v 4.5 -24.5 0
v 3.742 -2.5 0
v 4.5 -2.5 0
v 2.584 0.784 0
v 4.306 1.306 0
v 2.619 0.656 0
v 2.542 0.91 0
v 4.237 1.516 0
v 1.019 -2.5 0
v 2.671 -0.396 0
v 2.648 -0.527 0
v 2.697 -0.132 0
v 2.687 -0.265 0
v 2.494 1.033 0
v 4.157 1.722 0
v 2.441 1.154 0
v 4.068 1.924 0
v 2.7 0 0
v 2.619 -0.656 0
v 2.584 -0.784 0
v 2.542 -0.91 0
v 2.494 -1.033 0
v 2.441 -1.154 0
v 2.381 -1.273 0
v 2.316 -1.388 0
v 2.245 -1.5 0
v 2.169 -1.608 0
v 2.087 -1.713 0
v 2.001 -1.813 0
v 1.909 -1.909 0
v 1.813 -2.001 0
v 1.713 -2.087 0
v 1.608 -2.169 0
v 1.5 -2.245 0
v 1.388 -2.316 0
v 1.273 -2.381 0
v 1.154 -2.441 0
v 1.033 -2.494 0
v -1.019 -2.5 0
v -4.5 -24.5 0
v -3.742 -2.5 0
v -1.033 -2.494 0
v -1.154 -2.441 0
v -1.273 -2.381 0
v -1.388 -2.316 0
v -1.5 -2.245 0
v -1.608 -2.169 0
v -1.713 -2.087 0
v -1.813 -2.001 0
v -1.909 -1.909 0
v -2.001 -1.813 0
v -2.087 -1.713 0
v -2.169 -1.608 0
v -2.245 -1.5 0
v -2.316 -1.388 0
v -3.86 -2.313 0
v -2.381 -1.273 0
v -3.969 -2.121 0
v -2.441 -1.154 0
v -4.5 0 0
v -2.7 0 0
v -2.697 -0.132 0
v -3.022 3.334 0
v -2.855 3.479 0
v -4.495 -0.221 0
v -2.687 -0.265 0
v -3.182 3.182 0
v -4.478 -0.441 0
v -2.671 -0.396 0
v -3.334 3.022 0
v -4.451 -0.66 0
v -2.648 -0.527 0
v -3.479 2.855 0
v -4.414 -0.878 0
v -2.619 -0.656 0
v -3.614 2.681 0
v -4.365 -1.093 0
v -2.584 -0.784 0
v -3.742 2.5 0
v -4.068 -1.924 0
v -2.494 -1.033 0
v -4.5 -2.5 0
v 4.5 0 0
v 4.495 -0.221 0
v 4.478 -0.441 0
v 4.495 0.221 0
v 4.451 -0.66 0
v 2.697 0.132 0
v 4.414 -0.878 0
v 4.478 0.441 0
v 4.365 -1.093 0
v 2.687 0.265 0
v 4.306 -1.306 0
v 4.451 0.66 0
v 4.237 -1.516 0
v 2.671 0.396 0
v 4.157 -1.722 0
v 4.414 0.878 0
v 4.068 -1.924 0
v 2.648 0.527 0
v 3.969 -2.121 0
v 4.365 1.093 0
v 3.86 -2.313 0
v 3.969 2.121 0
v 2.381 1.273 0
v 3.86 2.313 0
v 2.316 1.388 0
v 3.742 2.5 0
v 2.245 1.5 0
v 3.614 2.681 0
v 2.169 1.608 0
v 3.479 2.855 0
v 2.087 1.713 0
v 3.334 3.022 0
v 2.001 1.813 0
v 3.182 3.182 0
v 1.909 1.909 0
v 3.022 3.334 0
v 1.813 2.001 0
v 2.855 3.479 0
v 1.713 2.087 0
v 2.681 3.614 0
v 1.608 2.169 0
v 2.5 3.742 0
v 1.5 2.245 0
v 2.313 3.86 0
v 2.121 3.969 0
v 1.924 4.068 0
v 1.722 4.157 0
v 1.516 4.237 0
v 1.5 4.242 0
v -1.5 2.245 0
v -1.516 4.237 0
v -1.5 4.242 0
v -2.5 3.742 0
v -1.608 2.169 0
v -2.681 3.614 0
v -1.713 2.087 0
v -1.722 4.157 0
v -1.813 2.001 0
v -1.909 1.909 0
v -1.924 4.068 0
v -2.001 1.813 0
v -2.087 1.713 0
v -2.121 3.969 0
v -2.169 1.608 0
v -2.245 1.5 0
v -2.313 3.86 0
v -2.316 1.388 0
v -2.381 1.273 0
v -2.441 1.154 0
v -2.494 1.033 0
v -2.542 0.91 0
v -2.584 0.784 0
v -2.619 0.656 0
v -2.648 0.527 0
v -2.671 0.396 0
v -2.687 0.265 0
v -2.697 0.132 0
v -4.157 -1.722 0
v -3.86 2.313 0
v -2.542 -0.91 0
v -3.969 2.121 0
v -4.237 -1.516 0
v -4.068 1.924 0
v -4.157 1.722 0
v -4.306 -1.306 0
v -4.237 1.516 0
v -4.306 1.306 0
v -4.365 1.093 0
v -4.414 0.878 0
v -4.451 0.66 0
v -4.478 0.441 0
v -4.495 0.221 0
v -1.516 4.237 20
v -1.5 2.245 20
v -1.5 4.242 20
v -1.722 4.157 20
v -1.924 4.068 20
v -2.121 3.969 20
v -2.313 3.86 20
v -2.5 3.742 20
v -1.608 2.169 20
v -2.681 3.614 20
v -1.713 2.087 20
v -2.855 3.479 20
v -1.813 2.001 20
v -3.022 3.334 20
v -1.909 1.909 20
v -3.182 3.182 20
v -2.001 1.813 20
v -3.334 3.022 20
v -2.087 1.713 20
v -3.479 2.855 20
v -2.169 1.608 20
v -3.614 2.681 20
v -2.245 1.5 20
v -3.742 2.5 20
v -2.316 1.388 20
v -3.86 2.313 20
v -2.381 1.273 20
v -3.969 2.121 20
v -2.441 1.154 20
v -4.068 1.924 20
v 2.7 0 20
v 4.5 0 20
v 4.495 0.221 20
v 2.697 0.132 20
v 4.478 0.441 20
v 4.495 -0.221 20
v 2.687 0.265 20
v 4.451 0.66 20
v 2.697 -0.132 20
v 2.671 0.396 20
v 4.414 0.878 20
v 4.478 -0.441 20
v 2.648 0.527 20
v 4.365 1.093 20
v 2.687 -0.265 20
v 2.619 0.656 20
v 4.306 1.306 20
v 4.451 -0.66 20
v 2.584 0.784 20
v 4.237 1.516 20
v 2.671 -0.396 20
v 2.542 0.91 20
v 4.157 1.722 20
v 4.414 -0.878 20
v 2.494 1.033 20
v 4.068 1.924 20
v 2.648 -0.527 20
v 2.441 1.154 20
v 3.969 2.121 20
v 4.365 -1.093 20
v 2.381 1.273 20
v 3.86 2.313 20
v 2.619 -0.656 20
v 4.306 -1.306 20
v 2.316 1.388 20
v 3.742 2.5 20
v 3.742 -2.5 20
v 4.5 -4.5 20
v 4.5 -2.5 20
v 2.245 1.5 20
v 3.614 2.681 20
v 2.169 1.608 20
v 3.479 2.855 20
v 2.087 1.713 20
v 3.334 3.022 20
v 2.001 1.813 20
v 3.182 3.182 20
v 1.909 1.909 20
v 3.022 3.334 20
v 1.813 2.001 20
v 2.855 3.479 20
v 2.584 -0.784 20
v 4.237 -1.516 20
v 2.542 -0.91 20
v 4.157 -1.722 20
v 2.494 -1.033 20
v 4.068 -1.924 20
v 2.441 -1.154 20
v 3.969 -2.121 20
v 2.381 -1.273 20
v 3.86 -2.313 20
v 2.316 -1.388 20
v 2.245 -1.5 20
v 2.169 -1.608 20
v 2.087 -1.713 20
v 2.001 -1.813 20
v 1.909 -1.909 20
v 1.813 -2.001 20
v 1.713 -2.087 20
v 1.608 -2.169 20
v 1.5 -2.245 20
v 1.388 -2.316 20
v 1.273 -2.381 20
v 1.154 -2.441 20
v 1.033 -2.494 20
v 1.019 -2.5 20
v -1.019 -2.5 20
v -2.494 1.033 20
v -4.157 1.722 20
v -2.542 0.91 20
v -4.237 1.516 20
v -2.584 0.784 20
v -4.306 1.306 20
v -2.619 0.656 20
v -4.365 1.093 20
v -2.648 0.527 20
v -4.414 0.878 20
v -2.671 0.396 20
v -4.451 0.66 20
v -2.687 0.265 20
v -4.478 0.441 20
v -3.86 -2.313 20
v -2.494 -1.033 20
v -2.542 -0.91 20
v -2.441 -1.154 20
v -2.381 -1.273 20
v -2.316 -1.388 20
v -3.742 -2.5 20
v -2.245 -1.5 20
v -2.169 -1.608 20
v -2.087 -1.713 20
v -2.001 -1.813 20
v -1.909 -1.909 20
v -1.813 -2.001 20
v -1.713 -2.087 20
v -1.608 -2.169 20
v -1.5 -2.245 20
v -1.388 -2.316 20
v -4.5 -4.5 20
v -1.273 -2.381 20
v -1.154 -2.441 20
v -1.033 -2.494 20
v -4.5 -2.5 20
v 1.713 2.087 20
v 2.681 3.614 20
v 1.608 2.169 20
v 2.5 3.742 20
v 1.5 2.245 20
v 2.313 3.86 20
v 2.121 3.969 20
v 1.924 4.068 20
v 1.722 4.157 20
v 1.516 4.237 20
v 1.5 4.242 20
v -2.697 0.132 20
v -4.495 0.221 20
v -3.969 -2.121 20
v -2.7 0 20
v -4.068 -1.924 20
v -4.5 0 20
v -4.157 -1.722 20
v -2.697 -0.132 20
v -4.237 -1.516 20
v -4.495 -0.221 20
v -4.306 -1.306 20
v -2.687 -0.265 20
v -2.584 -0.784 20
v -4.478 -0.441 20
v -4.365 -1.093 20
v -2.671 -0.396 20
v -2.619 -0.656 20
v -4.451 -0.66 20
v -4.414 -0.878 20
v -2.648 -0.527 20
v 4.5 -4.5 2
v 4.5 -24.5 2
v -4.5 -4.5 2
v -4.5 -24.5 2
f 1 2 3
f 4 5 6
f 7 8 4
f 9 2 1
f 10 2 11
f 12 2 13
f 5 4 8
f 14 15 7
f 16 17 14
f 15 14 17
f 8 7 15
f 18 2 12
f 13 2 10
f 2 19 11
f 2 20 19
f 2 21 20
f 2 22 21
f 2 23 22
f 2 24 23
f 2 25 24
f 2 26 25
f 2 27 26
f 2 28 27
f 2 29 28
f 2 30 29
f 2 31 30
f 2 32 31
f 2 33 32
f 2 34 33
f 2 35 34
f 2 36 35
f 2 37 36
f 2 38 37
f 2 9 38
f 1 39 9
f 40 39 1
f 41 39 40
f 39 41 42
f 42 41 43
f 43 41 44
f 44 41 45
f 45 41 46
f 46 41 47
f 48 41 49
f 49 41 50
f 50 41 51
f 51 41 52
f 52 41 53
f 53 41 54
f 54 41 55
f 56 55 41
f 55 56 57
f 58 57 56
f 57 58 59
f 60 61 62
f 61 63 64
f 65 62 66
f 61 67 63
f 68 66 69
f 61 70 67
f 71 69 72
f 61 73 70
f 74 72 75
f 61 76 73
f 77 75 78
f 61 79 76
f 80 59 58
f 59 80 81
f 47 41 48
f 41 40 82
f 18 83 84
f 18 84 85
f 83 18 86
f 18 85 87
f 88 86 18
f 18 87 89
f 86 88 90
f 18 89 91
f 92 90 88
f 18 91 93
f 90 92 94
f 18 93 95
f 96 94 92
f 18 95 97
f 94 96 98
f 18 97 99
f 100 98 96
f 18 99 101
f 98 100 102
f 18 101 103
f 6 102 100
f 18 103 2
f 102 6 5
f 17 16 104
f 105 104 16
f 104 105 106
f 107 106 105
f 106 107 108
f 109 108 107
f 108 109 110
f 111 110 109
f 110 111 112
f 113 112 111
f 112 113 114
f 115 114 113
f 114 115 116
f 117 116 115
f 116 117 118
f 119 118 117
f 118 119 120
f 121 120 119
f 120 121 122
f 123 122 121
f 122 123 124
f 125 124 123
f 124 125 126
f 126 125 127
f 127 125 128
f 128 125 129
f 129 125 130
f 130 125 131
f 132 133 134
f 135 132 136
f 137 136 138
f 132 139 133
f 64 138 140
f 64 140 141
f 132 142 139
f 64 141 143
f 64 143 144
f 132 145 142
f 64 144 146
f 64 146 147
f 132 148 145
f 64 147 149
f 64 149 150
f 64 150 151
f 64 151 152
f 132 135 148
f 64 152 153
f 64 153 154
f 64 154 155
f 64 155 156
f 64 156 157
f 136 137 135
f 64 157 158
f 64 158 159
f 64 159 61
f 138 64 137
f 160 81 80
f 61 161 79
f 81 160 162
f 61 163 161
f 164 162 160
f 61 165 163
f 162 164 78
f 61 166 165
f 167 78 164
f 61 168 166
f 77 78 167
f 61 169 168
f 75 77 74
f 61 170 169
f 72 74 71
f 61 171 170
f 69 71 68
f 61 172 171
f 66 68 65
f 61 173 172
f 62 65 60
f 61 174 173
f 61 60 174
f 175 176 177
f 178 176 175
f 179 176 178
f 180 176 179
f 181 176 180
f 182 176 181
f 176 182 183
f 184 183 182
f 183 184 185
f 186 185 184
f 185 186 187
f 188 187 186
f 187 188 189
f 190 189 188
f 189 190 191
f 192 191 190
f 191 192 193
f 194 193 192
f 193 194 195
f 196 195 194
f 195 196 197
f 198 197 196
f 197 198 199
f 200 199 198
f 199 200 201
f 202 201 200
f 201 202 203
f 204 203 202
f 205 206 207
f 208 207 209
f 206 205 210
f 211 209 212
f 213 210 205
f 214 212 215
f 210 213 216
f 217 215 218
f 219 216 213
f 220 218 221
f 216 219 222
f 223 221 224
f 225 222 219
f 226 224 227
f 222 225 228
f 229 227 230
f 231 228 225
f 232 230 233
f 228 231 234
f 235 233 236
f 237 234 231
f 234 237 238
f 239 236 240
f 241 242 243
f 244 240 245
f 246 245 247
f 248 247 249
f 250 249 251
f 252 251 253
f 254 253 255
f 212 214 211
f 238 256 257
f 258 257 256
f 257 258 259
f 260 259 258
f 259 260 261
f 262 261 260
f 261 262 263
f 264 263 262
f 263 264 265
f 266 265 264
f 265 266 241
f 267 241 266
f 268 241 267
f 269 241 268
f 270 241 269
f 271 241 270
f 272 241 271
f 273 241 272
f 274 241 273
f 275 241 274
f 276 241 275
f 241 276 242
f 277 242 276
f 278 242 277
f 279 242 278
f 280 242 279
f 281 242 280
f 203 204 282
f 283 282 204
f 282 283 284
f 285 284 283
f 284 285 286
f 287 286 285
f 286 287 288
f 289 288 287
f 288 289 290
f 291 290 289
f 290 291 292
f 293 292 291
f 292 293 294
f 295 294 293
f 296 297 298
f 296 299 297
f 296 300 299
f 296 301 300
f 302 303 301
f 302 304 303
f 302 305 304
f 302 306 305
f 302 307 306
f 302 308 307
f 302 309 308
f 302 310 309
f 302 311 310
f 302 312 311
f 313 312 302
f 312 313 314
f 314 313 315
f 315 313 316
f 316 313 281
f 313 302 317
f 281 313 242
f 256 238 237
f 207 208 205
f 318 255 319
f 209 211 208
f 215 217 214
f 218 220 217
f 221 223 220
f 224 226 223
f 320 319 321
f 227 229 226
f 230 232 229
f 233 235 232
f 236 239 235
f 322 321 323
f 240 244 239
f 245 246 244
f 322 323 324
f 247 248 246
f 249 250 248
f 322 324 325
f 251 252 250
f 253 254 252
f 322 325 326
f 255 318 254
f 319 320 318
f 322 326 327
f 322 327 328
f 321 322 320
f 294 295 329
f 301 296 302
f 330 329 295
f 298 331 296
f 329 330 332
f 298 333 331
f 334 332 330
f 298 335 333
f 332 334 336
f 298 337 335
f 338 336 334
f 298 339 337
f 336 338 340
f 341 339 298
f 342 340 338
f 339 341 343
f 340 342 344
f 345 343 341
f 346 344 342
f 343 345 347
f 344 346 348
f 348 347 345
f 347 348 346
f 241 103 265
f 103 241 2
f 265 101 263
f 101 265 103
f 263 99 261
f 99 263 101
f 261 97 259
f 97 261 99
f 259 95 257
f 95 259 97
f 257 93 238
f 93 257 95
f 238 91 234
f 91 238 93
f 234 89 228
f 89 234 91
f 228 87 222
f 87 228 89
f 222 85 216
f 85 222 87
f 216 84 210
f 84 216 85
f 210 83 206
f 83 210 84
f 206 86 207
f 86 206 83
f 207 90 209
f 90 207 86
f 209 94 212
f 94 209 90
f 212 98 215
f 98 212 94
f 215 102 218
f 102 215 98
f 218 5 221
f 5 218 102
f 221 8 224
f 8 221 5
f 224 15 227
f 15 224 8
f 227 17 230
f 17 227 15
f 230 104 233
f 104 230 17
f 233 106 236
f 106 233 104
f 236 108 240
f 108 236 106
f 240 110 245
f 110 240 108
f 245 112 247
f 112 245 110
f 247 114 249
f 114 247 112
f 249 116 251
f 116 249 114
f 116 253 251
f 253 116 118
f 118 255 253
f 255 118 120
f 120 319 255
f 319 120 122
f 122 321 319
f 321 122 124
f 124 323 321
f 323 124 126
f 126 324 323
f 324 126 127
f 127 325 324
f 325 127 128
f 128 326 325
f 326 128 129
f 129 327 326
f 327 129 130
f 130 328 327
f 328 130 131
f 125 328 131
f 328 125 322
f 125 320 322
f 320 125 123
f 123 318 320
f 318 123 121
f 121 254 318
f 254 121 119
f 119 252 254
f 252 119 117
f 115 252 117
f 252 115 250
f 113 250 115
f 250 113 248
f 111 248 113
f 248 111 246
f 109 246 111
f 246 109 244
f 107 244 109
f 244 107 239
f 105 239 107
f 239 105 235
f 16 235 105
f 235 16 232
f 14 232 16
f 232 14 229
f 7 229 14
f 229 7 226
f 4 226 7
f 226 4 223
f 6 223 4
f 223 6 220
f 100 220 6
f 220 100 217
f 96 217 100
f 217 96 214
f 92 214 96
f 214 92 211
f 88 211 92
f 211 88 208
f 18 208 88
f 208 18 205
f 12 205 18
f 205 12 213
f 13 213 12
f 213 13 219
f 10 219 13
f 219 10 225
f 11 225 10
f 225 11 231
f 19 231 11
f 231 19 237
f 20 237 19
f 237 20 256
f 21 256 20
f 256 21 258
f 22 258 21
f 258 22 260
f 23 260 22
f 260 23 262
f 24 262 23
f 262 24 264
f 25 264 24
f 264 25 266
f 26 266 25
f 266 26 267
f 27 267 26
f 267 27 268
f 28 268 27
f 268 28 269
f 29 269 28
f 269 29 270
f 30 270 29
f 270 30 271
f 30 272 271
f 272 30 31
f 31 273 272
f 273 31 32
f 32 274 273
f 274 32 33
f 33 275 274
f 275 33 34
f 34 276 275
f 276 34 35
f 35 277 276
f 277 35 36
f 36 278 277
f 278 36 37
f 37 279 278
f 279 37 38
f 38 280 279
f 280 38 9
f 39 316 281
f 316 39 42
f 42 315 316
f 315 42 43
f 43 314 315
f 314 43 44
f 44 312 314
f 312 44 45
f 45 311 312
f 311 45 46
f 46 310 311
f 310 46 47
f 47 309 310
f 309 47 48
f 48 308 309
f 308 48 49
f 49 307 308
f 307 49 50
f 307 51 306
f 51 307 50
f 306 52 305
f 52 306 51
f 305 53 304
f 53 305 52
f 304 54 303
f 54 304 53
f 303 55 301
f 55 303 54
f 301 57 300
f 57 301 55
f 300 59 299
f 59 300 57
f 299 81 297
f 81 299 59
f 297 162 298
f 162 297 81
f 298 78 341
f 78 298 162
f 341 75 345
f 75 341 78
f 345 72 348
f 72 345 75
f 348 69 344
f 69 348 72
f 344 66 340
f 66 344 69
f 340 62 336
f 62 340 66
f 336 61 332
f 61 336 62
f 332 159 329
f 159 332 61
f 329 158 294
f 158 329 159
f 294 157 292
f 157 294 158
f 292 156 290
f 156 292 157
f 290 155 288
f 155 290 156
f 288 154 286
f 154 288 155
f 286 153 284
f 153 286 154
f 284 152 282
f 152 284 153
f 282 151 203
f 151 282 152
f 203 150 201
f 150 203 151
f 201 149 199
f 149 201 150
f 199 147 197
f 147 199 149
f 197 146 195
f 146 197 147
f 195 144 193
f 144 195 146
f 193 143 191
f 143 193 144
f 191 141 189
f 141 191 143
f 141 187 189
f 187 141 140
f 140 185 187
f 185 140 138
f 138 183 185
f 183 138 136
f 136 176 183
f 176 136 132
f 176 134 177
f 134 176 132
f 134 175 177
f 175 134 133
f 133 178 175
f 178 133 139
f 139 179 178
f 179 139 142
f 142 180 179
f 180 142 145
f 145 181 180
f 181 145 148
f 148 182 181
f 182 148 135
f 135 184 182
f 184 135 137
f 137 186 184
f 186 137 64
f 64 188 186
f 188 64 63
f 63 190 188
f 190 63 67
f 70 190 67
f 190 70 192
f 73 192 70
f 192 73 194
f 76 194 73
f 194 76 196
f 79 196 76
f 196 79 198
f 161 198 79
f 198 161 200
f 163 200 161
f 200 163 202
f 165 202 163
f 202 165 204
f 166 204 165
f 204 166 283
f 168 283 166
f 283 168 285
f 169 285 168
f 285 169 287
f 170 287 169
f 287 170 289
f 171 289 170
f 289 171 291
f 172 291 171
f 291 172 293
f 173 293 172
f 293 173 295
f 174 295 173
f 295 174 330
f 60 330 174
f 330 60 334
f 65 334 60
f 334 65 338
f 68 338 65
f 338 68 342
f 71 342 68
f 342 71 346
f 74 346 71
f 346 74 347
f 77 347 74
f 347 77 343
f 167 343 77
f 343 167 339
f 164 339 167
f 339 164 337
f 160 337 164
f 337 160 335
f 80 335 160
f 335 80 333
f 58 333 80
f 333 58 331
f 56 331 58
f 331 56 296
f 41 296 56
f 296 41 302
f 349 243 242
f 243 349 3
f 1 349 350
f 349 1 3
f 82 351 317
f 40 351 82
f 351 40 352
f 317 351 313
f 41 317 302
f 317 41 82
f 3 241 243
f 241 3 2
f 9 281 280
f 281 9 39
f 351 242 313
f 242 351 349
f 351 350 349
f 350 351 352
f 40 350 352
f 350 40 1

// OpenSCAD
// file: ../../common/utils.scad
// Common utilities and shared variables
// Include this file at the top of your models:
//   include <../../common/utils.scad>

// ── Units ────────────────────────────────────────────────────────────────────
// All dimensions in millimeters

// ── Print tolerances ─────────────────────────────────────────────────────────
// Gap to add when two parts need to fit together (e.g., peg into a hole)
FIT_CLEARANCE = 0.2;  // mm

// Tolerance for press-fit / tight connections
PRESS_FIT = 0.1;  // mm

// ── Quality settings ─────────────────────────────────────────────────────────
// Override per-model if needed
$fn = $preview ? 32 : 128;  // Circle/sphere resolution

// ── Common layer heights ──────────────────────────────────────────────────────
LAYER_HEIGHT      = 0.2;   // standard
FIRST_LAYER       = 0.3;   // slightly thicker first layer
MIN_WALL          = 0.4;   // single extrusion width (0.4 mm nozzle)
// main file
// Simple cable clip / cord organizer
// Clips onto a desk edge or surface.
//
// Render: openscad -o cable-clip.stl cable-clip.scad

include <../../common/utils.scad>

// ── Parameters ────────────────────────────────────────────────────────────────
cable_diameter = 5;    // mm – diameter of the cable to hold
wall           = 2;    // mm – wall thickness
length         = 20;   // mm – depth of the clip
desk_thickness = 20;   // mm – thickness of the surface it clips to

// ── Computed ──────────────────────────────────────────────────────────────────
outer_r = cable_diameter / 2 + wall;
inner_r = cable_diameter / 2 + FIT_CLEARANCE;
gap     = cable_diameter * 0.6;  // opening wide enough to snap a cable in

// ── Model ─────────────────────────────────────────────────────────────────────
module cable_clip() {
    difference() {
        union() {
            // Clip body (C-shape cross-section extruded along length)
            linear_extrude(length)
                difference() {
                    circle(r = outer_r);
                    circle(r = inner_r);
                    // Cut gap for snapping cable in
                    translate([0, inner_r])
                        square([gap, outer_r * 2], center = true);
                }

            // Mounting tab that hooks under desk edge
            translate([-outer_r, -outer_r, 0])
                cube([outer_r * 2, wall, length]);
            translate([-outer_r, -outer_r - desk_thickness, 0])
                cube([outer_r * 2, desk_thickness + wall, wall]);
        }
    }
}

cable_clip();
